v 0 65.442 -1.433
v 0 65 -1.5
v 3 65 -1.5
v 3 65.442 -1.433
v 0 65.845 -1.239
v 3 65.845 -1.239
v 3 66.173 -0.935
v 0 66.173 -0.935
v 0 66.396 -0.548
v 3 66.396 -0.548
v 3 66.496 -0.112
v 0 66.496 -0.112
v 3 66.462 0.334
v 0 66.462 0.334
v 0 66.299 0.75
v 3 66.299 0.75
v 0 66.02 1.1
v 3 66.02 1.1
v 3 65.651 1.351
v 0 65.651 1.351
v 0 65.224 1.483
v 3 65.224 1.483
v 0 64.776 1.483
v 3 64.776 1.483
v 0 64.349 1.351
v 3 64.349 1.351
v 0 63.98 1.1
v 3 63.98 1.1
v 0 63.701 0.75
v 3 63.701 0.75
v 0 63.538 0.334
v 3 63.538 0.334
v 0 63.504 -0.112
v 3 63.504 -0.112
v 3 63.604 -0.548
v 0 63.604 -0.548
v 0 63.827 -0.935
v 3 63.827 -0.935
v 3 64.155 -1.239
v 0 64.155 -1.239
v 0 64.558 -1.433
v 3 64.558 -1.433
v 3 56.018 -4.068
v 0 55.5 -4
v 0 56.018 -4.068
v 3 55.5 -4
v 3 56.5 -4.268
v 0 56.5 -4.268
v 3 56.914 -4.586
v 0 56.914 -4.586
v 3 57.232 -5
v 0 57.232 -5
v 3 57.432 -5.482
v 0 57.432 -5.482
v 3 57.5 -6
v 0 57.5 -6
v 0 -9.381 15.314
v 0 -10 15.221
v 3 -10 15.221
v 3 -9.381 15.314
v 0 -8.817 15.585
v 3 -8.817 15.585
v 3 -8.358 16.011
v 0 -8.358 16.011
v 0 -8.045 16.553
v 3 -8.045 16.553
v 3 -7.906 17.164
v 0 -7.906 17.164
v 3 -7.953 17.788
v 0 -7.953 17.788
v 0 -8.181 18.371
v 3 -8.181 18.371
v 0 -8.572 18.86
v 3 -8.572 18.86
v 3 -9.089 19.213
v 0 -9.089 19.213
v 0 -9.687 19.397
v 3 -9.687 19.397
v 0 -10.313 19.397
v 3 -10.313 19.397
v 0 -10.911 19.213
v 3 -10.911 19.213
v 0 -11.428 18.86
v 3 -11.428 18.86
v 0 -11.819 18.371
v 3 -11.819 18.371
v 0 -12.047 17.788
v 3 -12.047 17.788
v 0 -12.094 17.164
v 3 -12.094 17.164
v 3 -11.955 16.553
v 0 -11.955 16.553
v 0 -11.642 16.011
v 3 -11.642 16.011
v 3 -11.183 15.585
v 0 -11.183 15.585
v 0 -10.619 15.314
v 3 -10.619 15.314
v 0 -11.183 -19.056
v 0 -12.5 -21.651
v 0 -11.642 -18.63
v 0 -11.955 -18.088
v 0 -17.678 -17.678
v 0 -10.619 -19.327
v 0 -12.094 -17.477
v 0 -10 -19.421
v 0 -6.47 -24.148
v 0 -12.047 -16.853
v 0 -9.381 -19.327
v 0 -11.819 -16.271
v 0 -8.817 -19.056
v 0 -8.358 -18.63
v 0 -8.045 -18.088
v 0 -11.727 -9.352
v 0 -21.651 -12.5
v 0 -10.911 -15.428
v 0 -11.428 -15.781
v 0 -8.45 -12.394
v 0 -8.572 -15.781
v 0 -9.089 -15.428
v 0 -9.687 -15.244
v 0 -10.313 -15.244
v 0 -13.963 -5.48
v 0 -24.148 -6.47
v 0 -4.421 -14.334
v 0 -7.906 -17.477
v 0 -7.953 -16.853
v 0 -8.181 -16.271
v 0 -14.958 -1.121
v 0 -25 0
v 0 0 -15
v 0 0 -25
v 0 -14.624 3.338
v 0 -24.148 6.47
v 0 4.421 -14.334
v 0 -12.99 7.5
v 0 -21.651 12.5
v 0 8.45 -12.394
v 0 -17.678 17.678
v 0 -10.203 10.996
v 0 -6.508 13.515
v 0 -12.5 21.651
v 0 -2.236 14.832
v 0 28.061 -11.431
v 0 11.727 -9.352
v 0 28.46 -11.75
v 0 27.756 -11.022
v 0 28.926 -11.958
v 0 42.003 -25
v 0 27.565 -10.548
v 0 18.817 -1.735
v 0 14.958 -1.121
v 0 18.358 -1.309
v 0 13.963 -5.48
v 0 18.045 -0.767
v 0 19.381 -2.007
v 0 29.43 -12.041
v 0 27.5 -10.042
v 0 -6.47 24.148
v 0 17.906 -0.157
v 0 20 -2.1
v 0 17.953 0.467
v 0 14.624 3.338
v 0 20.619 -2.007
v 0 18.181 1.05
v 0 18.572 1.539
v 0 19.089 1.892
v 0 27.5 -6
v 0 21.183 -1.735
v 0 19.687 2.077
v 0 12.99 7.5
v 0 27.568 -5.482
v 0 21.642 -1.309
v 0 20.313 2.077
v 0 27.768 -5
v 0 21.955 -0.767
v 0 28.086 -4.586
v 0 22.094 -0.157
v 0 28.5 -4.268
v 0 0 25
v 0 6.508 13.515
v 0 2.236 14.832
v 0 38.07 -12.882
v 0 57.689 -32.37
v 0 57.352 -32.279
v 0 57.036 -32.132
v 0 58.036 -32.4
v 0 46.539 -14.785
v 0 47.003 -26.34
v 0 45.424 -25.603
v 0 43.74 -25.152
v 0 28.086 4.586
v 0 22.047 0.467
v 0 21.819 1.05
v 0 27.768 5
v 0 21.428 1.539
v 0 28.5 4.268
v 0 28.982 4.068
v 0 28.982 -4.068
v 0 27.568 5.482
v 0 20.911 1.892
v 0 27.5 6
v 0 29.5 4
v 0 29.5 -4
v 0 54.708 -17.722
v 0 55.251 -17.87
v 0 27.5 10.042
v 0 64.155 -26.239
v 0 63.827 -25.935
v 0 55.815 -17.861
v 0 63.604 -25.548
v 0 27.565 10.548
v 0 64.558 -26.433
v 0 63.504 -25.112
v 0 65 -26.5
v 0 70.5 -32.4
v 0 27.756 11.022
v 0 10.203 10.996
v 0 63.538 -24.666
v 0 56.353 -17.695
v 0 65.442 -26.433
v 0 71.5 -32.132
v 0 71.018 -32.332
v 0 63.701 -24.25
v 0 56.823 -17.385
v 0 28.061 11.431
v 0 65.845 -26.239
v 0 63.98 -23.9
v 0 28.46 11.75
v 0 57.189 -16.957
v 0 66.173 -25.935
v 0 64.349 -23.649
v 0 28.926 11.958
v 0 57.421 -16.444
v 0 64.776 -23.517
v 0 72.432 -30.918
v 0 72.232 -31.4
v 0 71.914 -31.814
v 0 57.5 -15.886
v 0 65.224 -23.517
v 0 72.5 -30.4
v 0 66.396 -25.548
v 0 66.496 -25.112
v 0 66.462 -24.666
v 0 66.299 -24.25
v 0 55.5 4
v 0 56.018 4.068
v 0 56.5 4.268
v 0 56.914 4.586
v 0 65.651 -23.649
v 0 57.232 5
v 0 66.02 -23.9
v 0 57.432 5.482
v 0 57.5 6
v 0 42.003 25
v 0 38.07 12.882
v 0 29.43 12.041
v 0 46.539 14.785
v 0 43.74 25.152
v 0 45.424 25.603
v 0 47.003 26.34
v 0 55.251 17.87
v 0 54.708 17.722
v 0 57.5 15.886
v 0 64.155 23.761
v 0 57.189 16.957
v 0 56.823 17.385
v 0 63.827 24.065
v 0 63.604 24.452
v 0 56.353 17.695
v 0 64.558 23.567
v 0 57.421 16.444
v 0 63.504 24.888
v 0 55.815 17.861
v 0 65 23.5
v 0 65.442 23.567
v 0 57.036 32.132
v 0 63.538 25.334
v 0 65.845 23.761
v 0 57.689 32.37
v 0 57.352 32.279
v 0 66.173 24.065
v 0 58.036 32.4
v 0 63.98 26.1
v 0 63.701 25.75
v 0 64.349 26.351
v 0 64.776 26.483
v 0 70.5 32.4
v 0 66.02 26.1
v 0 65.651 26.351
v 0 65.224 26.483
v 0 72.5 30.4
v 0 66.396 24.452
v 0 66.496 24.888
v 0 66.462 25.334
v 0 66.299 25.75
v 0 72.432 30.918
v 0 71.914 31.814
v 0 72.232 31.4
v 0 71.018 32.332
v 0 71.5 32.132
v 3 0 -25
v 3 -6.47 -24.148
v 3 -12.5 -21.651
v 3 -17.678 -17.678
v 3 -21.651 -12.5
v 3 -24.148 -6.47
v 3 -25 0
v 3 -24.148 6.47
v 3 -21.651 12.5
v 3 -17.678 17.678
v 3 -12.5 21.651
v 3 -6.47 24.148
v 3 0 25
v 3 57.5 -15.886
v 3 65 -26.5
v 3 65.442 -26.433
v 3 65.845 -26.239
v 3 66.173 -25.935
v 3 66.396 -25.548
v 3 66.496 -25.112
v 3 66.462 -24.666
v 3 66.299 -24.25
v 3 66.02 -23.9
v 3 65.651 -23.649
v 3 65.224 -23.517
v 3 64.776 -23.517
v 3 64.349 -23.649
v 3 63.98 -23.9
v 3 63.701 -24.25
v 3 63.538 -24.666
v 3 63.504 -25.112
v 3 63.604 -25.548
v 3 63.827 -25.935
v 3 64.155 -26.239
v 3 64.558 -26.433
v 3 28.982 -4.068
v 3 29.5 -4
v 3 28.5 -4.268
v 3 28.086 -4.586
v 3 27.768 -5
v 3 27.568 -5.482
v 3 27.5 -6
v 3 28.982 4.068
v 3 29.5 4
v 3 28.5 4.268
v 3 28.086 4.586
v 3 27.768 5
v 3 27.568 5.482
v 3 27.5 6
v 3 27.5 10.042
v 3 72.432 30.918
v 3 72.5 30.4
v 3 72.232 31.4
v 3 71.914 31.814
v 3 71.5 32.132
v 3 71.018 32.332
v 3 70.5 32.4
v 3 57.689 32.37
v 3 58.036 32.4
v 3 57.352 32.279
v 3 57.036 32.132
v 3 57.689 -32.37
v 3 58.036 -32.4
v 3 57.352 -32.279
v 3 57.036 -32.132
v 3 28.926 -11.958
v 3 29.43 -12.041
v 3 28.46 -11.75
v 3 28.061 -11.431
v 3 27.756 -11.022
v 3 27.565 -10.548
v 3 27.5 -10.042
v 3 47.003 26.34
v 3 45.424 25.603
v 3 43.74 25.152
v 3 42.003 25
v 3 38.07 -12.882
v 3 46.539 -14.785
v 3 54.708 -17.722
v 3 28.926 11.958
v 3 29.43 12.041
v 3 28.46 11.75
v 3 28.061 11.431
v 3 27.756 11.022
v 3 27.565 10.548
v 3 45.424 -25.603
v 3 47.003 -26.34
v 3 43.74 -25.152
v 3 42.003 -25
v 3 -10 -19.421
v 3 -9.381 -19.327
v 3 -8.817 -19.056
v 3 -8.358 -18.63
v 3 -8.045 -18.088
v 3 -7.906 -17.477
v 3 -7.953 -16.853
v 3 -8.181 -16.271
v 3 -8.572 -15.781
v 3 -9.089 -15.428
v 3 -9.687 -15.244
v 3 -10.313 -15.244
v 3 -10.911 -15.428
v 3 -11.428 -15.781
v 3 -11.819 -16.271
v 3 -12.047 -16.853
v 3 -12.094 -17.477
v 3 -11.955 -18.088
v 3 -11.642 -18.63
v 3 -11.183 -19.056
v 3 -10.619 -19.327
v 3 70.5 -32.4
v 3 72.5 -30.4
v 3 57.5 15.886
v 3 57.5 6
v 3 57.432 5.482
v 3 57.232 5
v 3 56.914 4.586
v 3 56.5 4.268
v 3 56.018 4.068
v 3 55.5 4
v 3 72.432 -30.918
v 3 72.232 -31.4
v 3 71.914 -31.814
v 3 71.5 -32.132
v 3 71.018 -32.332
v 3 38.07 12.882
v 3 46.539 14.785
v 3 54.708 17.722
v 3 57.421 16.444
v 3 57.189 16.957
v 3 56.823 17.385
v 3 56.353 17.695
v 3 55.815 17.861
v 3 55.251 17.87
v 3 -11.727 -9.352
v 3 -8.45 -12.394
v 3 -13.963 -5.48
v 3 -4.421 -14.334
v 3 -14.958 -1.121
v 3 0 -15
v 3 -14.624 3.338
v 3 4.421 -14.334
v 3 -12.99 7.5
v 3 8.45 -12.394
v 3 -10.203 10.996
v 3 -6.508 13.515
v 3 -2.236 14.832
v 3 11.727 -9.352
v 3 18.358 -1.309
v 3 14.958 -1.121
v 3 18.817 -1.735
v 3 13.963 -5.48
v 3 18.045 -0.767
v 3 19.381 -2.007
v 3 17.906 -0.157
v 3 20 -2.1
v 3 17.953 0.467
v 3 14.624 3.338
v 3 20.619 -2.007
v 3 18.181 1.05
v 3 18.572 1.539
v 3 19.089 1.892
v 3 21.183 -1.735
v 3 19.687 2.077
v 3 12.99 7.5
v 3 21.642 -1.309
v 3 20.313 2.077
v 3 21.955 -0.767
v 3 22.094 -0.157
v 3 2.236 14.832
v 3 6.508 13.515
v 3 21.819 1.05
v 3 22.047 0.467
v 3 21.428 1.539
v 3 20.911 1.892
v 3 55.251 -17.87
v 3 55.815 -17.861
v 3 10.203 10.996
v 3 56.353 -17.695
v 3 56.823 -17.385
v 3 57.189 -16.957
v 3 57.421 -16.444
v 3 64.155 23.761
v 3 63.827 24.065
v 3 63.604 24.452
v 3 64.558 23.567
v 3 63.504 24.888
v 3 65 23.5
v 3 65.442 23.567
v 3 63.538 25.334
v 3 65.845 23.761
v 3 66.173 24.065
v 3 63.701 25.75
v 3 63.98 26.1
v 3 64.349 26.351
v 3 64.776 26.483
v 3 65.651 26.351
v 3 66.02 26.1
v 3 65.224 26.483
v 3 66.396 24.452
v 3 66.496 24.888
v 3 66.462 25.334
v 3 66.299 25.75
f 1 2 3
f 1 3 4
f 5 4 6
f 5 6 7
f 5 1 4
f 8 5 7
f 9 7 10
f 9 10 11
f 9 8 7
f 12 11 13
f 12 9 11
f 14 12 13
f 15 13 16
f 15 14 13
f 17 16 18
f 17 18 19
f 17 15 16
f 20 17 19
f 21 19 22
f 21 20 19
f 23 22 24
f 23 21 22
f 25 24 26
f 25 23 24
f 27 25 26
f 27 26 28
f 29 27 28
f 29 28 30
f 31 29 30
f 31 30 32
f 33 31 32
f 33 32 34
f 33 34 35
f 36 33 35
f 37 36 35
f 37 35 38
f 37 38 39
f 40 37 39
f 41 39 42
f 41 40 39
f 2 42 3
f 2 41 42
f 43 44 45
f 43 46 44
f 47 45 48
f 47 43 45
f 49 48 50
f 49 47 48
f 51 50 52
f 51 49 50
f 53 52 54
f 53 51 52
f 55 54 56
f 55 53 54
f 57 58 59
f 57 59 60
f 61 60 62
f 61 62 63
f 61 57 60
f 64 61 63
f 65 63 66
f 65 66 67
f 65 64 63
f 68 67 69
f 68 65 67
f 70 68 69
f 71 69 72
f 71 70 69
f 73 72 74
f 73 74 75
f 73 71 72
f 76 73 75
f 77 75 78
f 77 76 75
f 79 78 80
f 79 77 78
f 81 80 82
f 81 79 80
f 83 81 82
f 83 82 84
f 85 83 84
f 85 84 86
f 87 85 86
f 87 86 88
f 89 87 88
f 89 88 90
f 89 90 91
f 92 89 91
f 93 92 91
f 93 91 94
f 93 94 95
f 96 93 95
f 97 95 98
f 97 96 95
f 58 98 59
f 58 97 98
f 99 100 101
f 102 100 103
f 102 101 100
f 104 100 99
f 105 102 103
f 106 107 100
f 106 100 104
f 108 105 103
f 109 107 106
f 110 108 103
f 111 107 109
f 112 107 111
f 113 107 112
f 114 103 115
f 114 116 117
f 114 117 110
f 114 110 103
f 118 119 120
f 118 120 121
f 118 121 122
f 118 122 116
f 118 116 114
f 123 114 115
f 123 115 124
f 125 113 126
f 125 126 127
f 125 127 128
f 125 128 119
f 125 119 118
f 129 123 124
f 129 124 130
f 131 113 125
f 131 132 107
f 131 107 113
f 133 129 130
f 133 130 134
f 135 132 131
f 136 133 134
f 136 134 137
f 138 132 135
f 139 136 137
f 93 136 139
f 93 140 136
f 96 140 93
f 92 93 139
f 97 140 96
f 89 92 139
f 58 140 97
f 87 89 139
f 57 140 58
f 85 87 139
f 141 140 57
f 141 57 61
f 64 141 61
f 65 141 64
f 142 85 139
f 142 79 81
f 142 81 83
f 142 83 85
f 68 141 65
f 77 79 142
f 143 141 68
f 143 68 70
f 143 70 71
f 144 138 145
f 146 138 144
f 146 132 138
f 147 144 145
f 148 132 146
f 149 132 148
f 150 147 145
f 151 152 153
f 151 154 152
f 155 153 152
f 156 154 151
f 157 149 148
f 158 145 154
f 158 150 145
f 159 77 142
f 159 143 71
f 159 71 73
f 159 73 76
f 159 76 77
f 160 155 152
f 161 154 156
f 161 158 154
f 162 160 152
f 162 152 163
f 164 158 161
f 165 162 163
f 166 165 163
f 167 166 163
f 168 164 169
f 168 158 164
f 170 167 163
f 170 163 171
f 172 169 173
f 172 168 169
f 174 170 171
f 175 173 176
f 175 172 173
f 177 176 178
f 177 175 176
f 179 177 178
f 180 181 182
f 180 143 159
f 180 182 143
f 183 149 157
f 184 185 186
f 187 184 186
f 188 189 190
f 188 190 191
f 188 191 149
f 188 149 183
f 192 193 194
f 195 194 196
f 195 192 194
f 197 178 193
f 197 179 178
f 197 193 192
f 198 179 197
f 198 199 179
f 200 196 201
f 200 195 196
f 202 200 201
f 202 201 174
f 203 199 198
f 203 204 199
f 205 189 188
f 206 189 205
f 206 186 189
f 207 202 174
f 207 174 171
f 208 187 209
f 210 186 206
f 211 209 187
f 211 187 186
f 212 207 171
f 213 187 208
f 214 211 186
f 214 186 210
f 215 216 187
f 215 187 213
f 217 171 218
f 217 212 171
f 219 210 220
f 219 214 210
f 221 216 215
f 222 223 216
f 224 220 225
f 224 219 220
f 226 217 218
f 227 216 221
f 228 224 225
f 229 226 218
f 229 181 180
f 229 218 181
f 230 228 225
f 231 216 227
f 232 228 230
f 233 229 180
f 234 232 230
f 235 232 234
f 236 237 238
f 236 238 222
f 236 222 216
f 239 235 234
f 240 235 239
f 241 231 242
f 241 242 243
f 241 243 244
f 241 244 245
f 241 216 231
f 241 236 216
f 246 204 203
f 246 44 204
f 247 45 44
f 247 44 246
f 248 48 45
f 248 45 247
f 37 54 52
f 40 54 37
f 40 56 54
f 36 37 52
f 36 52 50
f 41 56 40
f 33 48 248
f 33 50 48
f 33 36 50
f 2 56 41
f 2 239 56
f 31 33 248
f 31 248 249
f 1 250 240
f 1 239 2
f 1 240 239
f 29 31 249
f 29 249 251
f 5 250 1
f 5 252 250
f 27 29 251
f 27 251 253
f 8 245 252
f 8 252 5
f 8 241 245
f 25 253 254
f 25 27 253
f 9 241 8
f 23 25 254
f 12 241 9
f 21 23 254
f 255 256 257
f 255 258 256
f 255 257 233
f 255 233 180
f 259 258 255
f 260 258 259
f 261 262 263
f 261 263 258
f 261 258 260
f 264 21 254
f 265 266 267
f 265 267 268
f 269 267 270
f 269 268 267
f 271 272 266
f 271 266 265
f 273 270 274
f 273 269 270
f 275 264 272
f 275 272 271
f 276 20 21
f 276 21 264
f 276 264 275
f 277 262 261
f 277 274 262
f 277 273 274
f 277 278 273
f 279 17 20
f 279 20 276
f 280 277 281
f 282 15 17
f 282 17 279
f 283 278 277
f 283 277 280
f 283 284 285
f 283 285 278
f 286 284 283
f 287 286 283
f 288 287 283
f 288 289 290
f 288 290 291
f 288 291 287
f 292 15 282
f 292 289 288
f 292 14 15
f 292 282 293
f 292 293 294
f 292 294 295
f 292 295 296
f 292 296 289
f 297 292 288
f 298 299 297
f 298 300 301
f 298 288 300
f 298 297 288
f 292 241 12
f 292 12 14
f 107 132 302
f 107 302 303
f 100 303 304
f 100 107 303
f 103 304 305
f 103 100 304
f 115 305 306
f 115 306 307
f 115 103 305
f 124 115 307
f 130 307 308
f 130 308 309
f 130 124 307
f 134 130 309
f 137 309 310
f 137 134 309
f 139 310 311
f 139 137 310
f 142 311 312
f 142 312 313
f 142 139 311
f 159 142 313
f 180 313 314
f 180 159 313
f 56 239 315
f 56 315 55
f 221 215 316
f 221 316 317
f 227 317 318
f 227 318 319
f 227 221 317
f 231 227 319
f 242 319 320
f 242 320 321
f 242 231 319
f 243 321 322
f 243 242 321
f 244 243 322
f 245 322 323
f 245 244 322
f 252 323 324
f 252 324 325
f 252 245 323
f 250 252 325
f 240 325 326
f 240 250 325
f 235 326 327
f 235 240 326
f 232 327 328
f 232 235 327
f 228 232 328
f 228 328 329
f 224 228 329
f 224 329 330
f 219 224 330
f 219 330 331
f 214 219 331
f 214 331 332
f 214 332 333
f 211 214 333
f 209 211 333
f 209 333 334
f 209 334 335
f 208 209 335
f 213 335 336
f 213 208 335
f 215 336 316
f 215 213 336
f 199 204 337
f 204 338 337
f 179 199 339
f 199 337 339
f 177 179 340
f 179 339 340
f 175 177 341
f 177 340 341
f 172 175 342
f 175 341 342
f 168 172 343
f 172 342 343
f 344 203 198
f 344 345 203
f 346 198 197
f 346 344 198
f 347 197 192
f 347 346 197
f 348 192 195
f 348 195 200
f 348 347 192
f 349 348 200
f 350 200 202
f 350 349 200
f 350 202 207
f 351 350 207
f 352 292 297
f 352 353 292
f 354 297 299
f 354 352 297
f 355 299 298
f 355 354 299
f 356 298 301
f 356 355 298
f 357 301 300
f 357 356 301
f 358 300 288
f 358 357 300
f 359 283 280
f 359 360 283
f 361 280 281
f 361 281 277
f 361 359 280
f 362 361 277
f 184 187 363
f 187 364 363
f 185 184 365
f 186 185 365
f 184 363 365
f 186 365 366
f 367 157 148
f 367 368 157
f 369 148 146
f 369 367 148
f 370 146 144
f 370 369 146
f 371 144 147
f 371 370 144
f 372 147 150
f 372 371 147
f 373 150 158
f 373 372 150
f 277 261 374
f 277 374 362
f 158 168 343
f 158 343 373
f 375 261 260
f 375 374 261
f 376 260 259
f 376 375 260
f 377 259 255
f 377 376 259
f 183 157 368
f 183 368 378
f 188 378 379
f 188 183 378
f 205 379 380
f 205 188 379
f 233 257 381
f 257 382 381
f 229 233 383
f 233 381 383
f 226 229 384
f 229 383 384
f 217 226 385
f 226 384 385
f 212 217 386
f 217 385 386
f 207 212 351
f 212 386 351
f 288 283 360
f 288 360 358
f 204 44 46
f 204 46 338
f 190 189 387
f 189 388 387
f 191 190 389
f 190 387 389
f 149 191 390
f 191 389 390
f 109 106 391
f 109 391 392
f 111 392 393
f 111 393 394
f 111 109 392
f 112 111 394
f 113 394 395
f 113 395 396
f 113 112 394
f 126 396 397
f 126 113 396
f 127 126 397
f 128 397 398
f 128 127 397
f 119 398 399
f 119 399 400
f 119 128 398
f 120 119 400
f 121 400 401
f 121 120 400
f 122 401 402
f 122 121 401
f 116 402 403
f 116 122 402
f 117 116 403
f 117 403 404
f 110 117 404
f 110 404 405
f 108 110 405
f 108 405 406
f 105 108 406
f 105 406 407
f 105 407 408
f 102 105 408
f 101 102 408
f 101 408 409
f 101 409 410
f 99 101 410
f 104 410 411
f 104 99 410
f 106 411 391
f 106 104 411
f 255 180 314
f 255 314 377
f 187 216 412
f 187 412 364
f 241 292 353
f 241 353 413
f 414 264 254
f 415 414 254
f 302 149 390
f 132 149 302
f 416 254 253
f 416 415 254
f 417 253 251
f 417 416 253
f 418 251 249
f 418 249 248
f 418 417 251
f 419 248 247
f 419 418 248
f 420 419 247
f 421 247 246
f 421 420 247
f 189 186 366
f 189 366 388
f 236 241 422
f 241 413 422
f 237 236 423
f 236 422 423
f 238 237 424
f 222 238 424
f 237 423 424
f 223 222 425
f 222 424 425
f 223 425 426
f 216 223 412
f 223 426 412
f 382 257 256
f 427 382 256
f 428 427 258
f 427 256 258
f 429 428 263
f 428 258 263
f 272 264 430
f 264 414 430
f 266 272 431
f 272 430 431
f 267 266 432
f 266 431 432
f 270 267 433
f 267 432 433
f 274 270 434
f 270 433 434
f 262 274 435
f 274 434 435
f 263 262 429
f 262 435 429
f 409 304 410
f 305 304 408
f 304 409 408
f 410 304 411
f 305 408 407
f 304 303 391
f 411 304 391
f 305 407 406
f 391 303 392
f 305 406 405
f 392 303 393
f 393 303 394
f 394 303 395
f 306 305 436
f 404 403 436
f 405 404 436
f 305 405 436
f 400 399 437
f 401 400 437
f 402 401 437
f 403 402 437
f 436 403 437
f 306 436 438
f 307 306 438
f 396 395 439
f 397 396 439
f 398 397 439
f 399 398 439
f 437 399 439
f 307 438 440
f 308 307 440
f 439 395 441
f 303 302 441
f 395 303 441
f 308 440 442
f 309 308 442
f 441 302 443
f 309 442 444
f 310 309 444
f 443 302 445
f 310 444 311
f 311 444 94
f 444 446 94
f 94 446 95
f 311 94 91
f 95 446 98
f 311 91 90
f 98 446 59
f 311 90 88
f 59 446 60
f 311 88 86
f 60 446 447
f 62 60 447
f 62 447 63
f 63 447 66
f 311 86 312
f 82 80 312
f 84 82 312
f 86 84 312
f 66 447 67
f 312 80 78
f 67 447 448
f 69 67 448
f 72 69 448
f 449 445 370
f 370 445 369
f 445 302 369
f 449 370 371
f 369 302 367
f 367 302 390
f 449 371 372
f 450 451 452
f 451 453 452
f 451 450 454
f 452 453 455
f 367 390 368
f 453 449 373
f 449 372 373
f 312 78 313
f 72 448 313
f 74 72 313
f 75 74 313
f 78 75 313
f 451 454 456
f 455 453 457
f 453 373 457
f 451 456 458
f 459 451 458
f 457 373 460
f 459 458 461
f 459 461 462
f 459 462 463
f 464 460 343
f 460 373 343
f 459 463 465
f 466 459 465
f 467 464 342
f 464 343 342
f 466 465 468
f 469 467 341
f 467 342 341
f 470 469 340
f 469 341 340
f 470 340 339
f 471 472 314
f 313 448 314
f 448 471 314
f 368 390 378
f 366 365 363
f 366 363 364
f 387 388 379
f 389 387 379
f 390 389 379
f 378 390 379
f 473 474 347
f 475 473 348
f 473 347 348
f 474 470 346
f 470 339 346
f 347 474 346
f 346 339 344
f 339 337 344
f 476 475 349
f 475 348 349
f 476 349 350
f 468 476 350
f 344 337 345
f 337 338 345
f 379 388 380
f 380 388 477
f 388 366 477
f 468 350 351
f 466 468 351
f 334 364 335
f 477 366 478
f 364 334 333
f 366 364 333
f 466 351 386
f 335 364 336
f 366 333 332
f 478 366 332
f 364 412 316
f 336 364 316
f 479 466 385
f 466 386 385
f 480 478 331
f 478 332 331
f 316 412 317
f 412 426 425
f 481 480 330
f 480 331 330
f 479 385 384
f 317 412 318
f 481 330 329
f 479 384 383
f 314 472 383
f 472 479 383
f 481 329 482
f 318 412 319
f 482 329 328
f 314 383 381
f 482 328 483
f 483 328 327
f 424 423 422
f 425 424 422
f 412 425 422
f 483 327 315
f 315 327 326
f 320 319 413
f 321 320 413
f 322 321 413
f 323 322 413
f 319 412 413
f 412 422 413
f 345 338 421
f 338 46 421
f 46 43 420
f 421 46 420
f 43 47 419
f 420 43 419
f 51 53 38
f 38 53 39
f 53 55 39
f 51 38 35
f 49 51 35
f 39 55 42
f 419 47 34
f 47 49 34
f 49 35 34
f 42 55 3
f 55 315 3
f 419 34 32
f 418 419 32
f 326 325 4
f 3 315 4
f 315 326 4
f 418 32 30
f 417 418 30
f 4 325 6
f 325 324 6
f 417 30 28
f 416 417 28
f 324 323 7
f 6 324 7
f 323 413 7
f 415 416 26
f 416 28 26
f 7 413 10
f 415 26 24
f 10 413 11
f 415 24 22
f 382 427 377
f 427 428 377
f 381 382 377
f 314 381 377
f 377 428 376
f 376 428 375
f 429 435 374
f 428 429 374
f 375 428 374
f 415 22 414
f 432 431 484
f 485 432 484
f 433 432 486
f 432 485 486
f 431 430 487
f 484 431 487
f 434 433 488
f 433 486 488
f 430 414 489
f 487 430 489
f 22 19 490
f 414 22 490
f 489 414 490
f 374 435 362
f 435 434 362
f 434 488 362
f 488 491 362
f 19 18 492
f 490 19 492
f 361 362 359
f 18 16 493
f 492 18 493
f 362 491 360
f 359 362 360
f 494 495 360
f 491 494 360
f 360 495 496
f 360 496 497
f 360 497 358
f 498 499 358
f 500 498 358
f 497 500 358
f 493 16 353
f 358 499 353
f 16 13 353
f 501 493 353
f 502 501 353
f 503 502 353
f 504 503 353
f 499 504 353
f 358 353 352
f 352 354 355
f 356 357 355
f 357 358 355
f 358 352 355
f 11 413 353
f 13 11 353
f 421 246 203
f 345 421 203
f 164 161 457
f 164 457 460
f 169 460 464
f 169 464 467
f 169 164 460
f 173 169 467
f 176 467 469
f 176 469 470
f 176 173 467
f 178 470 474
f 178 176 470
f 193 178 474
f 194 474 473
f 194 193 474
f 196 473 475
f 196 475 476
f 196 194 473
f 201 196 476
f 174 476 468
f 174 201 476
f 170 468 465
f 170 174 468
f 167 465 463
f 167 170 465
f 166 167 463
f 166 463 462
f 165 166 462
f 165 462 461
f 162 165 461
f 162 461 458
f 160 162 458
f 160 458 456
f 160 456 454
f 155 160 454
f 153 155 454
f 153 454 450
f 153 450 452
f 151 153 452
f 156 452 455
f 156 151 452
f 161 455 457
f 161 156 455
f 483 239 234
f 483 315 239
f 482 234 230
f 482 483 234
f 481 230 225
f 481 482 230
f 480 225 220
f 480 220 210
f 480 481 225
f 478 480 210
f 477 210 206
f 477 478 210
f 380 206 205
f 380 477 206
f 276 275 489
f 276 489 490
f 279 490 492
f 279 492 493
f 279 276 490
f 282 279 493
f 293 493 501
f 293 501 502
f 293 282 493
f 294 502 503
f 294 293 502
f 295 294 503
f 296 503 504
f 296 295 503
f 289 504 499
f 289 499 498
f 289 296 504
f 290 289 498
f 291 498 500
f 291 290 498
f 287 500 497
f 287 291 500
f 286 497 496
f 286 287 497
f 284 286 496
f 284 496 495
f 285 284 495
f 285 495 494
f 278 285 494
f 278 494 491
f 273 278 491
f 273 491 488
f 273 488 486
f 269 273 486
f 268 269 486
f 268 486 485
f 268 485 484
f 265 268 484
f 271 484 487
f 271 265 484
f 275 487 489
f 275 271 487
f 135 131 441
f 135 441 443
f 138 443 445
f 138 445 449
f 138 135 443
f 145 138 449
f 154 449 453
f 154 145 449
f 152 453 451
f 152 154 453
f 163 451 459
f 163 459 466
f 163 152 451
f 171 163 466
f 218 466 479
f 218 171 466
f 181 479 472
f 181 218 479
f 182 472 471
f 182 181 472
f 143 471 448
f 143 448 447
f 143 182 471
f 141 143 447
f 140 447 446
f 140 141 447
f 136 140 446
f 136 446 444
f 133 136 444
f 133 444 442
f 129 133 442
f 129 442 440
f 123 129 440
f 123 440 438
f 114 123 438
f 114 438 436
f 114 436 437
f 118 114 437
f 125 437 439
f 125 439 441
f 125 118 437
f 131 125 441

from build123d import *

# Parameters (mm, degrees)
SKETCH_1_R      = 15
SKETCH_1_R_2    = 2.1
SKETCH_1_R_3    = 1.5
EXTRUDE_1_DEPTH = 3
FILLET_2_R      = 2
FILLET_3_R      = 10


with BuildPart() as part:
    # 草图1 → 凸台-拉伸1 (new body)
    with BuildSketch(Plane(origin=(0, 0, 0), x_dir=(0, 0, -1), z_dir=(1, 0, 0))):
        with BuildLine():
            Line((-32.4, 72.5), (32.4, 72.5))
            Line((32.4, 72.5), (32.4, 57.5))
            Line((32.4, 57.5), (25, 44.682824024))
            Line((25, 44.682824024), (25, 0))
            ThreePointArc((25, 0), (0, -25), (-25, 0))
            Line((-25, 0), (-25, 44.682824024))
            Line((-25, 44.682824024), (-32.4, 57.5))
            Line((-32.4, 57.5), (-32.4, 72.5))
        make_face()
        Circle(SKETCH_1_R, mode=Mode.SUBTRACT)
        with Locations((0, 20)):
            Circle(SKETCH_1_R_2, mode=Mode.SUBTRACT)
        with Locations((17.320508076, -10)):
            Circle(SKETCH_1_R_2, mode=Mode.SUBTRACT)
        with Locations((-17.320508076, -10)):
            Circle(SKETCH_1_R_2, mode=Mode.SUBTRACT)
        with Locations((-25, 65)):
            Circle(SKETCH_1_R_3, mode=Mode.SUBTRACT)
        with Locations((0, 65)):
            Circle(SKETCH_1_R_3, mode=Mode.SUBTRACT)
        with Locations((25, 65)):
            Circle(SKETCH_1_R_3, mode=Mode.SUBTRACT)
        with BuildLine():
            Line((-19, 57.5), (-4, 57.5))
            Line((-4, 57.5), (-4, 27.5))
            Line((-4, 27.5), (-12, 27.5))
            ThreePointArc((-12, 27.5), (-13.829211823, 42.889850575), (-19, 57.5))
        make_face(mode=Mode.SUBTRACT)
        with BuildLine():
            Line((4, 27.5), (12, 27.5))
            ThreePointArc((12, 27.5), (13.829211823, 42.889850575), (19, 57.5))
            Line((19, 57.5), (4, 57.5))
            Line((4, 57.5), (4, 27.5))
        make_face(mode=Mode.SUBTRACT)
    extrude(amount=EXTRUDE_1_DEPTH)

    # 圆角2
    fillet_2_edges = [part.edges().sort_by_distance(p)[0] for p in [
        (1.5, 72.5, 32.4),
        (1.5, 72.5, -32.4),
        (1.5, 57.5, -32.4),
        (1.5, 57.5, 32.4),
        (1.5, 57.5, 19),
        (1.5, 27.5, 12),
        (1.5, 27.5, 4),
        (1.5, 57.5, 4),
        (1.5, 27.5, -12),
        (1.5, 57.5, -19),
        (1.5, 57.5, -4),
        (1.5, 27.5, -4),
    ]]
    fillet(fillet_2_edges, radius=FILLET_2_R)

    # 圆角3
    fillet_3_edges = [part.edges().sort_by_distance(p)[0] for p in [
        (1.5, 44.682824024, -25),
        (1.5, 44.682824024, 25),
    ]]
    fillet(fillet_3_edges, radius=FILLET_3_R)


solid = part.part
